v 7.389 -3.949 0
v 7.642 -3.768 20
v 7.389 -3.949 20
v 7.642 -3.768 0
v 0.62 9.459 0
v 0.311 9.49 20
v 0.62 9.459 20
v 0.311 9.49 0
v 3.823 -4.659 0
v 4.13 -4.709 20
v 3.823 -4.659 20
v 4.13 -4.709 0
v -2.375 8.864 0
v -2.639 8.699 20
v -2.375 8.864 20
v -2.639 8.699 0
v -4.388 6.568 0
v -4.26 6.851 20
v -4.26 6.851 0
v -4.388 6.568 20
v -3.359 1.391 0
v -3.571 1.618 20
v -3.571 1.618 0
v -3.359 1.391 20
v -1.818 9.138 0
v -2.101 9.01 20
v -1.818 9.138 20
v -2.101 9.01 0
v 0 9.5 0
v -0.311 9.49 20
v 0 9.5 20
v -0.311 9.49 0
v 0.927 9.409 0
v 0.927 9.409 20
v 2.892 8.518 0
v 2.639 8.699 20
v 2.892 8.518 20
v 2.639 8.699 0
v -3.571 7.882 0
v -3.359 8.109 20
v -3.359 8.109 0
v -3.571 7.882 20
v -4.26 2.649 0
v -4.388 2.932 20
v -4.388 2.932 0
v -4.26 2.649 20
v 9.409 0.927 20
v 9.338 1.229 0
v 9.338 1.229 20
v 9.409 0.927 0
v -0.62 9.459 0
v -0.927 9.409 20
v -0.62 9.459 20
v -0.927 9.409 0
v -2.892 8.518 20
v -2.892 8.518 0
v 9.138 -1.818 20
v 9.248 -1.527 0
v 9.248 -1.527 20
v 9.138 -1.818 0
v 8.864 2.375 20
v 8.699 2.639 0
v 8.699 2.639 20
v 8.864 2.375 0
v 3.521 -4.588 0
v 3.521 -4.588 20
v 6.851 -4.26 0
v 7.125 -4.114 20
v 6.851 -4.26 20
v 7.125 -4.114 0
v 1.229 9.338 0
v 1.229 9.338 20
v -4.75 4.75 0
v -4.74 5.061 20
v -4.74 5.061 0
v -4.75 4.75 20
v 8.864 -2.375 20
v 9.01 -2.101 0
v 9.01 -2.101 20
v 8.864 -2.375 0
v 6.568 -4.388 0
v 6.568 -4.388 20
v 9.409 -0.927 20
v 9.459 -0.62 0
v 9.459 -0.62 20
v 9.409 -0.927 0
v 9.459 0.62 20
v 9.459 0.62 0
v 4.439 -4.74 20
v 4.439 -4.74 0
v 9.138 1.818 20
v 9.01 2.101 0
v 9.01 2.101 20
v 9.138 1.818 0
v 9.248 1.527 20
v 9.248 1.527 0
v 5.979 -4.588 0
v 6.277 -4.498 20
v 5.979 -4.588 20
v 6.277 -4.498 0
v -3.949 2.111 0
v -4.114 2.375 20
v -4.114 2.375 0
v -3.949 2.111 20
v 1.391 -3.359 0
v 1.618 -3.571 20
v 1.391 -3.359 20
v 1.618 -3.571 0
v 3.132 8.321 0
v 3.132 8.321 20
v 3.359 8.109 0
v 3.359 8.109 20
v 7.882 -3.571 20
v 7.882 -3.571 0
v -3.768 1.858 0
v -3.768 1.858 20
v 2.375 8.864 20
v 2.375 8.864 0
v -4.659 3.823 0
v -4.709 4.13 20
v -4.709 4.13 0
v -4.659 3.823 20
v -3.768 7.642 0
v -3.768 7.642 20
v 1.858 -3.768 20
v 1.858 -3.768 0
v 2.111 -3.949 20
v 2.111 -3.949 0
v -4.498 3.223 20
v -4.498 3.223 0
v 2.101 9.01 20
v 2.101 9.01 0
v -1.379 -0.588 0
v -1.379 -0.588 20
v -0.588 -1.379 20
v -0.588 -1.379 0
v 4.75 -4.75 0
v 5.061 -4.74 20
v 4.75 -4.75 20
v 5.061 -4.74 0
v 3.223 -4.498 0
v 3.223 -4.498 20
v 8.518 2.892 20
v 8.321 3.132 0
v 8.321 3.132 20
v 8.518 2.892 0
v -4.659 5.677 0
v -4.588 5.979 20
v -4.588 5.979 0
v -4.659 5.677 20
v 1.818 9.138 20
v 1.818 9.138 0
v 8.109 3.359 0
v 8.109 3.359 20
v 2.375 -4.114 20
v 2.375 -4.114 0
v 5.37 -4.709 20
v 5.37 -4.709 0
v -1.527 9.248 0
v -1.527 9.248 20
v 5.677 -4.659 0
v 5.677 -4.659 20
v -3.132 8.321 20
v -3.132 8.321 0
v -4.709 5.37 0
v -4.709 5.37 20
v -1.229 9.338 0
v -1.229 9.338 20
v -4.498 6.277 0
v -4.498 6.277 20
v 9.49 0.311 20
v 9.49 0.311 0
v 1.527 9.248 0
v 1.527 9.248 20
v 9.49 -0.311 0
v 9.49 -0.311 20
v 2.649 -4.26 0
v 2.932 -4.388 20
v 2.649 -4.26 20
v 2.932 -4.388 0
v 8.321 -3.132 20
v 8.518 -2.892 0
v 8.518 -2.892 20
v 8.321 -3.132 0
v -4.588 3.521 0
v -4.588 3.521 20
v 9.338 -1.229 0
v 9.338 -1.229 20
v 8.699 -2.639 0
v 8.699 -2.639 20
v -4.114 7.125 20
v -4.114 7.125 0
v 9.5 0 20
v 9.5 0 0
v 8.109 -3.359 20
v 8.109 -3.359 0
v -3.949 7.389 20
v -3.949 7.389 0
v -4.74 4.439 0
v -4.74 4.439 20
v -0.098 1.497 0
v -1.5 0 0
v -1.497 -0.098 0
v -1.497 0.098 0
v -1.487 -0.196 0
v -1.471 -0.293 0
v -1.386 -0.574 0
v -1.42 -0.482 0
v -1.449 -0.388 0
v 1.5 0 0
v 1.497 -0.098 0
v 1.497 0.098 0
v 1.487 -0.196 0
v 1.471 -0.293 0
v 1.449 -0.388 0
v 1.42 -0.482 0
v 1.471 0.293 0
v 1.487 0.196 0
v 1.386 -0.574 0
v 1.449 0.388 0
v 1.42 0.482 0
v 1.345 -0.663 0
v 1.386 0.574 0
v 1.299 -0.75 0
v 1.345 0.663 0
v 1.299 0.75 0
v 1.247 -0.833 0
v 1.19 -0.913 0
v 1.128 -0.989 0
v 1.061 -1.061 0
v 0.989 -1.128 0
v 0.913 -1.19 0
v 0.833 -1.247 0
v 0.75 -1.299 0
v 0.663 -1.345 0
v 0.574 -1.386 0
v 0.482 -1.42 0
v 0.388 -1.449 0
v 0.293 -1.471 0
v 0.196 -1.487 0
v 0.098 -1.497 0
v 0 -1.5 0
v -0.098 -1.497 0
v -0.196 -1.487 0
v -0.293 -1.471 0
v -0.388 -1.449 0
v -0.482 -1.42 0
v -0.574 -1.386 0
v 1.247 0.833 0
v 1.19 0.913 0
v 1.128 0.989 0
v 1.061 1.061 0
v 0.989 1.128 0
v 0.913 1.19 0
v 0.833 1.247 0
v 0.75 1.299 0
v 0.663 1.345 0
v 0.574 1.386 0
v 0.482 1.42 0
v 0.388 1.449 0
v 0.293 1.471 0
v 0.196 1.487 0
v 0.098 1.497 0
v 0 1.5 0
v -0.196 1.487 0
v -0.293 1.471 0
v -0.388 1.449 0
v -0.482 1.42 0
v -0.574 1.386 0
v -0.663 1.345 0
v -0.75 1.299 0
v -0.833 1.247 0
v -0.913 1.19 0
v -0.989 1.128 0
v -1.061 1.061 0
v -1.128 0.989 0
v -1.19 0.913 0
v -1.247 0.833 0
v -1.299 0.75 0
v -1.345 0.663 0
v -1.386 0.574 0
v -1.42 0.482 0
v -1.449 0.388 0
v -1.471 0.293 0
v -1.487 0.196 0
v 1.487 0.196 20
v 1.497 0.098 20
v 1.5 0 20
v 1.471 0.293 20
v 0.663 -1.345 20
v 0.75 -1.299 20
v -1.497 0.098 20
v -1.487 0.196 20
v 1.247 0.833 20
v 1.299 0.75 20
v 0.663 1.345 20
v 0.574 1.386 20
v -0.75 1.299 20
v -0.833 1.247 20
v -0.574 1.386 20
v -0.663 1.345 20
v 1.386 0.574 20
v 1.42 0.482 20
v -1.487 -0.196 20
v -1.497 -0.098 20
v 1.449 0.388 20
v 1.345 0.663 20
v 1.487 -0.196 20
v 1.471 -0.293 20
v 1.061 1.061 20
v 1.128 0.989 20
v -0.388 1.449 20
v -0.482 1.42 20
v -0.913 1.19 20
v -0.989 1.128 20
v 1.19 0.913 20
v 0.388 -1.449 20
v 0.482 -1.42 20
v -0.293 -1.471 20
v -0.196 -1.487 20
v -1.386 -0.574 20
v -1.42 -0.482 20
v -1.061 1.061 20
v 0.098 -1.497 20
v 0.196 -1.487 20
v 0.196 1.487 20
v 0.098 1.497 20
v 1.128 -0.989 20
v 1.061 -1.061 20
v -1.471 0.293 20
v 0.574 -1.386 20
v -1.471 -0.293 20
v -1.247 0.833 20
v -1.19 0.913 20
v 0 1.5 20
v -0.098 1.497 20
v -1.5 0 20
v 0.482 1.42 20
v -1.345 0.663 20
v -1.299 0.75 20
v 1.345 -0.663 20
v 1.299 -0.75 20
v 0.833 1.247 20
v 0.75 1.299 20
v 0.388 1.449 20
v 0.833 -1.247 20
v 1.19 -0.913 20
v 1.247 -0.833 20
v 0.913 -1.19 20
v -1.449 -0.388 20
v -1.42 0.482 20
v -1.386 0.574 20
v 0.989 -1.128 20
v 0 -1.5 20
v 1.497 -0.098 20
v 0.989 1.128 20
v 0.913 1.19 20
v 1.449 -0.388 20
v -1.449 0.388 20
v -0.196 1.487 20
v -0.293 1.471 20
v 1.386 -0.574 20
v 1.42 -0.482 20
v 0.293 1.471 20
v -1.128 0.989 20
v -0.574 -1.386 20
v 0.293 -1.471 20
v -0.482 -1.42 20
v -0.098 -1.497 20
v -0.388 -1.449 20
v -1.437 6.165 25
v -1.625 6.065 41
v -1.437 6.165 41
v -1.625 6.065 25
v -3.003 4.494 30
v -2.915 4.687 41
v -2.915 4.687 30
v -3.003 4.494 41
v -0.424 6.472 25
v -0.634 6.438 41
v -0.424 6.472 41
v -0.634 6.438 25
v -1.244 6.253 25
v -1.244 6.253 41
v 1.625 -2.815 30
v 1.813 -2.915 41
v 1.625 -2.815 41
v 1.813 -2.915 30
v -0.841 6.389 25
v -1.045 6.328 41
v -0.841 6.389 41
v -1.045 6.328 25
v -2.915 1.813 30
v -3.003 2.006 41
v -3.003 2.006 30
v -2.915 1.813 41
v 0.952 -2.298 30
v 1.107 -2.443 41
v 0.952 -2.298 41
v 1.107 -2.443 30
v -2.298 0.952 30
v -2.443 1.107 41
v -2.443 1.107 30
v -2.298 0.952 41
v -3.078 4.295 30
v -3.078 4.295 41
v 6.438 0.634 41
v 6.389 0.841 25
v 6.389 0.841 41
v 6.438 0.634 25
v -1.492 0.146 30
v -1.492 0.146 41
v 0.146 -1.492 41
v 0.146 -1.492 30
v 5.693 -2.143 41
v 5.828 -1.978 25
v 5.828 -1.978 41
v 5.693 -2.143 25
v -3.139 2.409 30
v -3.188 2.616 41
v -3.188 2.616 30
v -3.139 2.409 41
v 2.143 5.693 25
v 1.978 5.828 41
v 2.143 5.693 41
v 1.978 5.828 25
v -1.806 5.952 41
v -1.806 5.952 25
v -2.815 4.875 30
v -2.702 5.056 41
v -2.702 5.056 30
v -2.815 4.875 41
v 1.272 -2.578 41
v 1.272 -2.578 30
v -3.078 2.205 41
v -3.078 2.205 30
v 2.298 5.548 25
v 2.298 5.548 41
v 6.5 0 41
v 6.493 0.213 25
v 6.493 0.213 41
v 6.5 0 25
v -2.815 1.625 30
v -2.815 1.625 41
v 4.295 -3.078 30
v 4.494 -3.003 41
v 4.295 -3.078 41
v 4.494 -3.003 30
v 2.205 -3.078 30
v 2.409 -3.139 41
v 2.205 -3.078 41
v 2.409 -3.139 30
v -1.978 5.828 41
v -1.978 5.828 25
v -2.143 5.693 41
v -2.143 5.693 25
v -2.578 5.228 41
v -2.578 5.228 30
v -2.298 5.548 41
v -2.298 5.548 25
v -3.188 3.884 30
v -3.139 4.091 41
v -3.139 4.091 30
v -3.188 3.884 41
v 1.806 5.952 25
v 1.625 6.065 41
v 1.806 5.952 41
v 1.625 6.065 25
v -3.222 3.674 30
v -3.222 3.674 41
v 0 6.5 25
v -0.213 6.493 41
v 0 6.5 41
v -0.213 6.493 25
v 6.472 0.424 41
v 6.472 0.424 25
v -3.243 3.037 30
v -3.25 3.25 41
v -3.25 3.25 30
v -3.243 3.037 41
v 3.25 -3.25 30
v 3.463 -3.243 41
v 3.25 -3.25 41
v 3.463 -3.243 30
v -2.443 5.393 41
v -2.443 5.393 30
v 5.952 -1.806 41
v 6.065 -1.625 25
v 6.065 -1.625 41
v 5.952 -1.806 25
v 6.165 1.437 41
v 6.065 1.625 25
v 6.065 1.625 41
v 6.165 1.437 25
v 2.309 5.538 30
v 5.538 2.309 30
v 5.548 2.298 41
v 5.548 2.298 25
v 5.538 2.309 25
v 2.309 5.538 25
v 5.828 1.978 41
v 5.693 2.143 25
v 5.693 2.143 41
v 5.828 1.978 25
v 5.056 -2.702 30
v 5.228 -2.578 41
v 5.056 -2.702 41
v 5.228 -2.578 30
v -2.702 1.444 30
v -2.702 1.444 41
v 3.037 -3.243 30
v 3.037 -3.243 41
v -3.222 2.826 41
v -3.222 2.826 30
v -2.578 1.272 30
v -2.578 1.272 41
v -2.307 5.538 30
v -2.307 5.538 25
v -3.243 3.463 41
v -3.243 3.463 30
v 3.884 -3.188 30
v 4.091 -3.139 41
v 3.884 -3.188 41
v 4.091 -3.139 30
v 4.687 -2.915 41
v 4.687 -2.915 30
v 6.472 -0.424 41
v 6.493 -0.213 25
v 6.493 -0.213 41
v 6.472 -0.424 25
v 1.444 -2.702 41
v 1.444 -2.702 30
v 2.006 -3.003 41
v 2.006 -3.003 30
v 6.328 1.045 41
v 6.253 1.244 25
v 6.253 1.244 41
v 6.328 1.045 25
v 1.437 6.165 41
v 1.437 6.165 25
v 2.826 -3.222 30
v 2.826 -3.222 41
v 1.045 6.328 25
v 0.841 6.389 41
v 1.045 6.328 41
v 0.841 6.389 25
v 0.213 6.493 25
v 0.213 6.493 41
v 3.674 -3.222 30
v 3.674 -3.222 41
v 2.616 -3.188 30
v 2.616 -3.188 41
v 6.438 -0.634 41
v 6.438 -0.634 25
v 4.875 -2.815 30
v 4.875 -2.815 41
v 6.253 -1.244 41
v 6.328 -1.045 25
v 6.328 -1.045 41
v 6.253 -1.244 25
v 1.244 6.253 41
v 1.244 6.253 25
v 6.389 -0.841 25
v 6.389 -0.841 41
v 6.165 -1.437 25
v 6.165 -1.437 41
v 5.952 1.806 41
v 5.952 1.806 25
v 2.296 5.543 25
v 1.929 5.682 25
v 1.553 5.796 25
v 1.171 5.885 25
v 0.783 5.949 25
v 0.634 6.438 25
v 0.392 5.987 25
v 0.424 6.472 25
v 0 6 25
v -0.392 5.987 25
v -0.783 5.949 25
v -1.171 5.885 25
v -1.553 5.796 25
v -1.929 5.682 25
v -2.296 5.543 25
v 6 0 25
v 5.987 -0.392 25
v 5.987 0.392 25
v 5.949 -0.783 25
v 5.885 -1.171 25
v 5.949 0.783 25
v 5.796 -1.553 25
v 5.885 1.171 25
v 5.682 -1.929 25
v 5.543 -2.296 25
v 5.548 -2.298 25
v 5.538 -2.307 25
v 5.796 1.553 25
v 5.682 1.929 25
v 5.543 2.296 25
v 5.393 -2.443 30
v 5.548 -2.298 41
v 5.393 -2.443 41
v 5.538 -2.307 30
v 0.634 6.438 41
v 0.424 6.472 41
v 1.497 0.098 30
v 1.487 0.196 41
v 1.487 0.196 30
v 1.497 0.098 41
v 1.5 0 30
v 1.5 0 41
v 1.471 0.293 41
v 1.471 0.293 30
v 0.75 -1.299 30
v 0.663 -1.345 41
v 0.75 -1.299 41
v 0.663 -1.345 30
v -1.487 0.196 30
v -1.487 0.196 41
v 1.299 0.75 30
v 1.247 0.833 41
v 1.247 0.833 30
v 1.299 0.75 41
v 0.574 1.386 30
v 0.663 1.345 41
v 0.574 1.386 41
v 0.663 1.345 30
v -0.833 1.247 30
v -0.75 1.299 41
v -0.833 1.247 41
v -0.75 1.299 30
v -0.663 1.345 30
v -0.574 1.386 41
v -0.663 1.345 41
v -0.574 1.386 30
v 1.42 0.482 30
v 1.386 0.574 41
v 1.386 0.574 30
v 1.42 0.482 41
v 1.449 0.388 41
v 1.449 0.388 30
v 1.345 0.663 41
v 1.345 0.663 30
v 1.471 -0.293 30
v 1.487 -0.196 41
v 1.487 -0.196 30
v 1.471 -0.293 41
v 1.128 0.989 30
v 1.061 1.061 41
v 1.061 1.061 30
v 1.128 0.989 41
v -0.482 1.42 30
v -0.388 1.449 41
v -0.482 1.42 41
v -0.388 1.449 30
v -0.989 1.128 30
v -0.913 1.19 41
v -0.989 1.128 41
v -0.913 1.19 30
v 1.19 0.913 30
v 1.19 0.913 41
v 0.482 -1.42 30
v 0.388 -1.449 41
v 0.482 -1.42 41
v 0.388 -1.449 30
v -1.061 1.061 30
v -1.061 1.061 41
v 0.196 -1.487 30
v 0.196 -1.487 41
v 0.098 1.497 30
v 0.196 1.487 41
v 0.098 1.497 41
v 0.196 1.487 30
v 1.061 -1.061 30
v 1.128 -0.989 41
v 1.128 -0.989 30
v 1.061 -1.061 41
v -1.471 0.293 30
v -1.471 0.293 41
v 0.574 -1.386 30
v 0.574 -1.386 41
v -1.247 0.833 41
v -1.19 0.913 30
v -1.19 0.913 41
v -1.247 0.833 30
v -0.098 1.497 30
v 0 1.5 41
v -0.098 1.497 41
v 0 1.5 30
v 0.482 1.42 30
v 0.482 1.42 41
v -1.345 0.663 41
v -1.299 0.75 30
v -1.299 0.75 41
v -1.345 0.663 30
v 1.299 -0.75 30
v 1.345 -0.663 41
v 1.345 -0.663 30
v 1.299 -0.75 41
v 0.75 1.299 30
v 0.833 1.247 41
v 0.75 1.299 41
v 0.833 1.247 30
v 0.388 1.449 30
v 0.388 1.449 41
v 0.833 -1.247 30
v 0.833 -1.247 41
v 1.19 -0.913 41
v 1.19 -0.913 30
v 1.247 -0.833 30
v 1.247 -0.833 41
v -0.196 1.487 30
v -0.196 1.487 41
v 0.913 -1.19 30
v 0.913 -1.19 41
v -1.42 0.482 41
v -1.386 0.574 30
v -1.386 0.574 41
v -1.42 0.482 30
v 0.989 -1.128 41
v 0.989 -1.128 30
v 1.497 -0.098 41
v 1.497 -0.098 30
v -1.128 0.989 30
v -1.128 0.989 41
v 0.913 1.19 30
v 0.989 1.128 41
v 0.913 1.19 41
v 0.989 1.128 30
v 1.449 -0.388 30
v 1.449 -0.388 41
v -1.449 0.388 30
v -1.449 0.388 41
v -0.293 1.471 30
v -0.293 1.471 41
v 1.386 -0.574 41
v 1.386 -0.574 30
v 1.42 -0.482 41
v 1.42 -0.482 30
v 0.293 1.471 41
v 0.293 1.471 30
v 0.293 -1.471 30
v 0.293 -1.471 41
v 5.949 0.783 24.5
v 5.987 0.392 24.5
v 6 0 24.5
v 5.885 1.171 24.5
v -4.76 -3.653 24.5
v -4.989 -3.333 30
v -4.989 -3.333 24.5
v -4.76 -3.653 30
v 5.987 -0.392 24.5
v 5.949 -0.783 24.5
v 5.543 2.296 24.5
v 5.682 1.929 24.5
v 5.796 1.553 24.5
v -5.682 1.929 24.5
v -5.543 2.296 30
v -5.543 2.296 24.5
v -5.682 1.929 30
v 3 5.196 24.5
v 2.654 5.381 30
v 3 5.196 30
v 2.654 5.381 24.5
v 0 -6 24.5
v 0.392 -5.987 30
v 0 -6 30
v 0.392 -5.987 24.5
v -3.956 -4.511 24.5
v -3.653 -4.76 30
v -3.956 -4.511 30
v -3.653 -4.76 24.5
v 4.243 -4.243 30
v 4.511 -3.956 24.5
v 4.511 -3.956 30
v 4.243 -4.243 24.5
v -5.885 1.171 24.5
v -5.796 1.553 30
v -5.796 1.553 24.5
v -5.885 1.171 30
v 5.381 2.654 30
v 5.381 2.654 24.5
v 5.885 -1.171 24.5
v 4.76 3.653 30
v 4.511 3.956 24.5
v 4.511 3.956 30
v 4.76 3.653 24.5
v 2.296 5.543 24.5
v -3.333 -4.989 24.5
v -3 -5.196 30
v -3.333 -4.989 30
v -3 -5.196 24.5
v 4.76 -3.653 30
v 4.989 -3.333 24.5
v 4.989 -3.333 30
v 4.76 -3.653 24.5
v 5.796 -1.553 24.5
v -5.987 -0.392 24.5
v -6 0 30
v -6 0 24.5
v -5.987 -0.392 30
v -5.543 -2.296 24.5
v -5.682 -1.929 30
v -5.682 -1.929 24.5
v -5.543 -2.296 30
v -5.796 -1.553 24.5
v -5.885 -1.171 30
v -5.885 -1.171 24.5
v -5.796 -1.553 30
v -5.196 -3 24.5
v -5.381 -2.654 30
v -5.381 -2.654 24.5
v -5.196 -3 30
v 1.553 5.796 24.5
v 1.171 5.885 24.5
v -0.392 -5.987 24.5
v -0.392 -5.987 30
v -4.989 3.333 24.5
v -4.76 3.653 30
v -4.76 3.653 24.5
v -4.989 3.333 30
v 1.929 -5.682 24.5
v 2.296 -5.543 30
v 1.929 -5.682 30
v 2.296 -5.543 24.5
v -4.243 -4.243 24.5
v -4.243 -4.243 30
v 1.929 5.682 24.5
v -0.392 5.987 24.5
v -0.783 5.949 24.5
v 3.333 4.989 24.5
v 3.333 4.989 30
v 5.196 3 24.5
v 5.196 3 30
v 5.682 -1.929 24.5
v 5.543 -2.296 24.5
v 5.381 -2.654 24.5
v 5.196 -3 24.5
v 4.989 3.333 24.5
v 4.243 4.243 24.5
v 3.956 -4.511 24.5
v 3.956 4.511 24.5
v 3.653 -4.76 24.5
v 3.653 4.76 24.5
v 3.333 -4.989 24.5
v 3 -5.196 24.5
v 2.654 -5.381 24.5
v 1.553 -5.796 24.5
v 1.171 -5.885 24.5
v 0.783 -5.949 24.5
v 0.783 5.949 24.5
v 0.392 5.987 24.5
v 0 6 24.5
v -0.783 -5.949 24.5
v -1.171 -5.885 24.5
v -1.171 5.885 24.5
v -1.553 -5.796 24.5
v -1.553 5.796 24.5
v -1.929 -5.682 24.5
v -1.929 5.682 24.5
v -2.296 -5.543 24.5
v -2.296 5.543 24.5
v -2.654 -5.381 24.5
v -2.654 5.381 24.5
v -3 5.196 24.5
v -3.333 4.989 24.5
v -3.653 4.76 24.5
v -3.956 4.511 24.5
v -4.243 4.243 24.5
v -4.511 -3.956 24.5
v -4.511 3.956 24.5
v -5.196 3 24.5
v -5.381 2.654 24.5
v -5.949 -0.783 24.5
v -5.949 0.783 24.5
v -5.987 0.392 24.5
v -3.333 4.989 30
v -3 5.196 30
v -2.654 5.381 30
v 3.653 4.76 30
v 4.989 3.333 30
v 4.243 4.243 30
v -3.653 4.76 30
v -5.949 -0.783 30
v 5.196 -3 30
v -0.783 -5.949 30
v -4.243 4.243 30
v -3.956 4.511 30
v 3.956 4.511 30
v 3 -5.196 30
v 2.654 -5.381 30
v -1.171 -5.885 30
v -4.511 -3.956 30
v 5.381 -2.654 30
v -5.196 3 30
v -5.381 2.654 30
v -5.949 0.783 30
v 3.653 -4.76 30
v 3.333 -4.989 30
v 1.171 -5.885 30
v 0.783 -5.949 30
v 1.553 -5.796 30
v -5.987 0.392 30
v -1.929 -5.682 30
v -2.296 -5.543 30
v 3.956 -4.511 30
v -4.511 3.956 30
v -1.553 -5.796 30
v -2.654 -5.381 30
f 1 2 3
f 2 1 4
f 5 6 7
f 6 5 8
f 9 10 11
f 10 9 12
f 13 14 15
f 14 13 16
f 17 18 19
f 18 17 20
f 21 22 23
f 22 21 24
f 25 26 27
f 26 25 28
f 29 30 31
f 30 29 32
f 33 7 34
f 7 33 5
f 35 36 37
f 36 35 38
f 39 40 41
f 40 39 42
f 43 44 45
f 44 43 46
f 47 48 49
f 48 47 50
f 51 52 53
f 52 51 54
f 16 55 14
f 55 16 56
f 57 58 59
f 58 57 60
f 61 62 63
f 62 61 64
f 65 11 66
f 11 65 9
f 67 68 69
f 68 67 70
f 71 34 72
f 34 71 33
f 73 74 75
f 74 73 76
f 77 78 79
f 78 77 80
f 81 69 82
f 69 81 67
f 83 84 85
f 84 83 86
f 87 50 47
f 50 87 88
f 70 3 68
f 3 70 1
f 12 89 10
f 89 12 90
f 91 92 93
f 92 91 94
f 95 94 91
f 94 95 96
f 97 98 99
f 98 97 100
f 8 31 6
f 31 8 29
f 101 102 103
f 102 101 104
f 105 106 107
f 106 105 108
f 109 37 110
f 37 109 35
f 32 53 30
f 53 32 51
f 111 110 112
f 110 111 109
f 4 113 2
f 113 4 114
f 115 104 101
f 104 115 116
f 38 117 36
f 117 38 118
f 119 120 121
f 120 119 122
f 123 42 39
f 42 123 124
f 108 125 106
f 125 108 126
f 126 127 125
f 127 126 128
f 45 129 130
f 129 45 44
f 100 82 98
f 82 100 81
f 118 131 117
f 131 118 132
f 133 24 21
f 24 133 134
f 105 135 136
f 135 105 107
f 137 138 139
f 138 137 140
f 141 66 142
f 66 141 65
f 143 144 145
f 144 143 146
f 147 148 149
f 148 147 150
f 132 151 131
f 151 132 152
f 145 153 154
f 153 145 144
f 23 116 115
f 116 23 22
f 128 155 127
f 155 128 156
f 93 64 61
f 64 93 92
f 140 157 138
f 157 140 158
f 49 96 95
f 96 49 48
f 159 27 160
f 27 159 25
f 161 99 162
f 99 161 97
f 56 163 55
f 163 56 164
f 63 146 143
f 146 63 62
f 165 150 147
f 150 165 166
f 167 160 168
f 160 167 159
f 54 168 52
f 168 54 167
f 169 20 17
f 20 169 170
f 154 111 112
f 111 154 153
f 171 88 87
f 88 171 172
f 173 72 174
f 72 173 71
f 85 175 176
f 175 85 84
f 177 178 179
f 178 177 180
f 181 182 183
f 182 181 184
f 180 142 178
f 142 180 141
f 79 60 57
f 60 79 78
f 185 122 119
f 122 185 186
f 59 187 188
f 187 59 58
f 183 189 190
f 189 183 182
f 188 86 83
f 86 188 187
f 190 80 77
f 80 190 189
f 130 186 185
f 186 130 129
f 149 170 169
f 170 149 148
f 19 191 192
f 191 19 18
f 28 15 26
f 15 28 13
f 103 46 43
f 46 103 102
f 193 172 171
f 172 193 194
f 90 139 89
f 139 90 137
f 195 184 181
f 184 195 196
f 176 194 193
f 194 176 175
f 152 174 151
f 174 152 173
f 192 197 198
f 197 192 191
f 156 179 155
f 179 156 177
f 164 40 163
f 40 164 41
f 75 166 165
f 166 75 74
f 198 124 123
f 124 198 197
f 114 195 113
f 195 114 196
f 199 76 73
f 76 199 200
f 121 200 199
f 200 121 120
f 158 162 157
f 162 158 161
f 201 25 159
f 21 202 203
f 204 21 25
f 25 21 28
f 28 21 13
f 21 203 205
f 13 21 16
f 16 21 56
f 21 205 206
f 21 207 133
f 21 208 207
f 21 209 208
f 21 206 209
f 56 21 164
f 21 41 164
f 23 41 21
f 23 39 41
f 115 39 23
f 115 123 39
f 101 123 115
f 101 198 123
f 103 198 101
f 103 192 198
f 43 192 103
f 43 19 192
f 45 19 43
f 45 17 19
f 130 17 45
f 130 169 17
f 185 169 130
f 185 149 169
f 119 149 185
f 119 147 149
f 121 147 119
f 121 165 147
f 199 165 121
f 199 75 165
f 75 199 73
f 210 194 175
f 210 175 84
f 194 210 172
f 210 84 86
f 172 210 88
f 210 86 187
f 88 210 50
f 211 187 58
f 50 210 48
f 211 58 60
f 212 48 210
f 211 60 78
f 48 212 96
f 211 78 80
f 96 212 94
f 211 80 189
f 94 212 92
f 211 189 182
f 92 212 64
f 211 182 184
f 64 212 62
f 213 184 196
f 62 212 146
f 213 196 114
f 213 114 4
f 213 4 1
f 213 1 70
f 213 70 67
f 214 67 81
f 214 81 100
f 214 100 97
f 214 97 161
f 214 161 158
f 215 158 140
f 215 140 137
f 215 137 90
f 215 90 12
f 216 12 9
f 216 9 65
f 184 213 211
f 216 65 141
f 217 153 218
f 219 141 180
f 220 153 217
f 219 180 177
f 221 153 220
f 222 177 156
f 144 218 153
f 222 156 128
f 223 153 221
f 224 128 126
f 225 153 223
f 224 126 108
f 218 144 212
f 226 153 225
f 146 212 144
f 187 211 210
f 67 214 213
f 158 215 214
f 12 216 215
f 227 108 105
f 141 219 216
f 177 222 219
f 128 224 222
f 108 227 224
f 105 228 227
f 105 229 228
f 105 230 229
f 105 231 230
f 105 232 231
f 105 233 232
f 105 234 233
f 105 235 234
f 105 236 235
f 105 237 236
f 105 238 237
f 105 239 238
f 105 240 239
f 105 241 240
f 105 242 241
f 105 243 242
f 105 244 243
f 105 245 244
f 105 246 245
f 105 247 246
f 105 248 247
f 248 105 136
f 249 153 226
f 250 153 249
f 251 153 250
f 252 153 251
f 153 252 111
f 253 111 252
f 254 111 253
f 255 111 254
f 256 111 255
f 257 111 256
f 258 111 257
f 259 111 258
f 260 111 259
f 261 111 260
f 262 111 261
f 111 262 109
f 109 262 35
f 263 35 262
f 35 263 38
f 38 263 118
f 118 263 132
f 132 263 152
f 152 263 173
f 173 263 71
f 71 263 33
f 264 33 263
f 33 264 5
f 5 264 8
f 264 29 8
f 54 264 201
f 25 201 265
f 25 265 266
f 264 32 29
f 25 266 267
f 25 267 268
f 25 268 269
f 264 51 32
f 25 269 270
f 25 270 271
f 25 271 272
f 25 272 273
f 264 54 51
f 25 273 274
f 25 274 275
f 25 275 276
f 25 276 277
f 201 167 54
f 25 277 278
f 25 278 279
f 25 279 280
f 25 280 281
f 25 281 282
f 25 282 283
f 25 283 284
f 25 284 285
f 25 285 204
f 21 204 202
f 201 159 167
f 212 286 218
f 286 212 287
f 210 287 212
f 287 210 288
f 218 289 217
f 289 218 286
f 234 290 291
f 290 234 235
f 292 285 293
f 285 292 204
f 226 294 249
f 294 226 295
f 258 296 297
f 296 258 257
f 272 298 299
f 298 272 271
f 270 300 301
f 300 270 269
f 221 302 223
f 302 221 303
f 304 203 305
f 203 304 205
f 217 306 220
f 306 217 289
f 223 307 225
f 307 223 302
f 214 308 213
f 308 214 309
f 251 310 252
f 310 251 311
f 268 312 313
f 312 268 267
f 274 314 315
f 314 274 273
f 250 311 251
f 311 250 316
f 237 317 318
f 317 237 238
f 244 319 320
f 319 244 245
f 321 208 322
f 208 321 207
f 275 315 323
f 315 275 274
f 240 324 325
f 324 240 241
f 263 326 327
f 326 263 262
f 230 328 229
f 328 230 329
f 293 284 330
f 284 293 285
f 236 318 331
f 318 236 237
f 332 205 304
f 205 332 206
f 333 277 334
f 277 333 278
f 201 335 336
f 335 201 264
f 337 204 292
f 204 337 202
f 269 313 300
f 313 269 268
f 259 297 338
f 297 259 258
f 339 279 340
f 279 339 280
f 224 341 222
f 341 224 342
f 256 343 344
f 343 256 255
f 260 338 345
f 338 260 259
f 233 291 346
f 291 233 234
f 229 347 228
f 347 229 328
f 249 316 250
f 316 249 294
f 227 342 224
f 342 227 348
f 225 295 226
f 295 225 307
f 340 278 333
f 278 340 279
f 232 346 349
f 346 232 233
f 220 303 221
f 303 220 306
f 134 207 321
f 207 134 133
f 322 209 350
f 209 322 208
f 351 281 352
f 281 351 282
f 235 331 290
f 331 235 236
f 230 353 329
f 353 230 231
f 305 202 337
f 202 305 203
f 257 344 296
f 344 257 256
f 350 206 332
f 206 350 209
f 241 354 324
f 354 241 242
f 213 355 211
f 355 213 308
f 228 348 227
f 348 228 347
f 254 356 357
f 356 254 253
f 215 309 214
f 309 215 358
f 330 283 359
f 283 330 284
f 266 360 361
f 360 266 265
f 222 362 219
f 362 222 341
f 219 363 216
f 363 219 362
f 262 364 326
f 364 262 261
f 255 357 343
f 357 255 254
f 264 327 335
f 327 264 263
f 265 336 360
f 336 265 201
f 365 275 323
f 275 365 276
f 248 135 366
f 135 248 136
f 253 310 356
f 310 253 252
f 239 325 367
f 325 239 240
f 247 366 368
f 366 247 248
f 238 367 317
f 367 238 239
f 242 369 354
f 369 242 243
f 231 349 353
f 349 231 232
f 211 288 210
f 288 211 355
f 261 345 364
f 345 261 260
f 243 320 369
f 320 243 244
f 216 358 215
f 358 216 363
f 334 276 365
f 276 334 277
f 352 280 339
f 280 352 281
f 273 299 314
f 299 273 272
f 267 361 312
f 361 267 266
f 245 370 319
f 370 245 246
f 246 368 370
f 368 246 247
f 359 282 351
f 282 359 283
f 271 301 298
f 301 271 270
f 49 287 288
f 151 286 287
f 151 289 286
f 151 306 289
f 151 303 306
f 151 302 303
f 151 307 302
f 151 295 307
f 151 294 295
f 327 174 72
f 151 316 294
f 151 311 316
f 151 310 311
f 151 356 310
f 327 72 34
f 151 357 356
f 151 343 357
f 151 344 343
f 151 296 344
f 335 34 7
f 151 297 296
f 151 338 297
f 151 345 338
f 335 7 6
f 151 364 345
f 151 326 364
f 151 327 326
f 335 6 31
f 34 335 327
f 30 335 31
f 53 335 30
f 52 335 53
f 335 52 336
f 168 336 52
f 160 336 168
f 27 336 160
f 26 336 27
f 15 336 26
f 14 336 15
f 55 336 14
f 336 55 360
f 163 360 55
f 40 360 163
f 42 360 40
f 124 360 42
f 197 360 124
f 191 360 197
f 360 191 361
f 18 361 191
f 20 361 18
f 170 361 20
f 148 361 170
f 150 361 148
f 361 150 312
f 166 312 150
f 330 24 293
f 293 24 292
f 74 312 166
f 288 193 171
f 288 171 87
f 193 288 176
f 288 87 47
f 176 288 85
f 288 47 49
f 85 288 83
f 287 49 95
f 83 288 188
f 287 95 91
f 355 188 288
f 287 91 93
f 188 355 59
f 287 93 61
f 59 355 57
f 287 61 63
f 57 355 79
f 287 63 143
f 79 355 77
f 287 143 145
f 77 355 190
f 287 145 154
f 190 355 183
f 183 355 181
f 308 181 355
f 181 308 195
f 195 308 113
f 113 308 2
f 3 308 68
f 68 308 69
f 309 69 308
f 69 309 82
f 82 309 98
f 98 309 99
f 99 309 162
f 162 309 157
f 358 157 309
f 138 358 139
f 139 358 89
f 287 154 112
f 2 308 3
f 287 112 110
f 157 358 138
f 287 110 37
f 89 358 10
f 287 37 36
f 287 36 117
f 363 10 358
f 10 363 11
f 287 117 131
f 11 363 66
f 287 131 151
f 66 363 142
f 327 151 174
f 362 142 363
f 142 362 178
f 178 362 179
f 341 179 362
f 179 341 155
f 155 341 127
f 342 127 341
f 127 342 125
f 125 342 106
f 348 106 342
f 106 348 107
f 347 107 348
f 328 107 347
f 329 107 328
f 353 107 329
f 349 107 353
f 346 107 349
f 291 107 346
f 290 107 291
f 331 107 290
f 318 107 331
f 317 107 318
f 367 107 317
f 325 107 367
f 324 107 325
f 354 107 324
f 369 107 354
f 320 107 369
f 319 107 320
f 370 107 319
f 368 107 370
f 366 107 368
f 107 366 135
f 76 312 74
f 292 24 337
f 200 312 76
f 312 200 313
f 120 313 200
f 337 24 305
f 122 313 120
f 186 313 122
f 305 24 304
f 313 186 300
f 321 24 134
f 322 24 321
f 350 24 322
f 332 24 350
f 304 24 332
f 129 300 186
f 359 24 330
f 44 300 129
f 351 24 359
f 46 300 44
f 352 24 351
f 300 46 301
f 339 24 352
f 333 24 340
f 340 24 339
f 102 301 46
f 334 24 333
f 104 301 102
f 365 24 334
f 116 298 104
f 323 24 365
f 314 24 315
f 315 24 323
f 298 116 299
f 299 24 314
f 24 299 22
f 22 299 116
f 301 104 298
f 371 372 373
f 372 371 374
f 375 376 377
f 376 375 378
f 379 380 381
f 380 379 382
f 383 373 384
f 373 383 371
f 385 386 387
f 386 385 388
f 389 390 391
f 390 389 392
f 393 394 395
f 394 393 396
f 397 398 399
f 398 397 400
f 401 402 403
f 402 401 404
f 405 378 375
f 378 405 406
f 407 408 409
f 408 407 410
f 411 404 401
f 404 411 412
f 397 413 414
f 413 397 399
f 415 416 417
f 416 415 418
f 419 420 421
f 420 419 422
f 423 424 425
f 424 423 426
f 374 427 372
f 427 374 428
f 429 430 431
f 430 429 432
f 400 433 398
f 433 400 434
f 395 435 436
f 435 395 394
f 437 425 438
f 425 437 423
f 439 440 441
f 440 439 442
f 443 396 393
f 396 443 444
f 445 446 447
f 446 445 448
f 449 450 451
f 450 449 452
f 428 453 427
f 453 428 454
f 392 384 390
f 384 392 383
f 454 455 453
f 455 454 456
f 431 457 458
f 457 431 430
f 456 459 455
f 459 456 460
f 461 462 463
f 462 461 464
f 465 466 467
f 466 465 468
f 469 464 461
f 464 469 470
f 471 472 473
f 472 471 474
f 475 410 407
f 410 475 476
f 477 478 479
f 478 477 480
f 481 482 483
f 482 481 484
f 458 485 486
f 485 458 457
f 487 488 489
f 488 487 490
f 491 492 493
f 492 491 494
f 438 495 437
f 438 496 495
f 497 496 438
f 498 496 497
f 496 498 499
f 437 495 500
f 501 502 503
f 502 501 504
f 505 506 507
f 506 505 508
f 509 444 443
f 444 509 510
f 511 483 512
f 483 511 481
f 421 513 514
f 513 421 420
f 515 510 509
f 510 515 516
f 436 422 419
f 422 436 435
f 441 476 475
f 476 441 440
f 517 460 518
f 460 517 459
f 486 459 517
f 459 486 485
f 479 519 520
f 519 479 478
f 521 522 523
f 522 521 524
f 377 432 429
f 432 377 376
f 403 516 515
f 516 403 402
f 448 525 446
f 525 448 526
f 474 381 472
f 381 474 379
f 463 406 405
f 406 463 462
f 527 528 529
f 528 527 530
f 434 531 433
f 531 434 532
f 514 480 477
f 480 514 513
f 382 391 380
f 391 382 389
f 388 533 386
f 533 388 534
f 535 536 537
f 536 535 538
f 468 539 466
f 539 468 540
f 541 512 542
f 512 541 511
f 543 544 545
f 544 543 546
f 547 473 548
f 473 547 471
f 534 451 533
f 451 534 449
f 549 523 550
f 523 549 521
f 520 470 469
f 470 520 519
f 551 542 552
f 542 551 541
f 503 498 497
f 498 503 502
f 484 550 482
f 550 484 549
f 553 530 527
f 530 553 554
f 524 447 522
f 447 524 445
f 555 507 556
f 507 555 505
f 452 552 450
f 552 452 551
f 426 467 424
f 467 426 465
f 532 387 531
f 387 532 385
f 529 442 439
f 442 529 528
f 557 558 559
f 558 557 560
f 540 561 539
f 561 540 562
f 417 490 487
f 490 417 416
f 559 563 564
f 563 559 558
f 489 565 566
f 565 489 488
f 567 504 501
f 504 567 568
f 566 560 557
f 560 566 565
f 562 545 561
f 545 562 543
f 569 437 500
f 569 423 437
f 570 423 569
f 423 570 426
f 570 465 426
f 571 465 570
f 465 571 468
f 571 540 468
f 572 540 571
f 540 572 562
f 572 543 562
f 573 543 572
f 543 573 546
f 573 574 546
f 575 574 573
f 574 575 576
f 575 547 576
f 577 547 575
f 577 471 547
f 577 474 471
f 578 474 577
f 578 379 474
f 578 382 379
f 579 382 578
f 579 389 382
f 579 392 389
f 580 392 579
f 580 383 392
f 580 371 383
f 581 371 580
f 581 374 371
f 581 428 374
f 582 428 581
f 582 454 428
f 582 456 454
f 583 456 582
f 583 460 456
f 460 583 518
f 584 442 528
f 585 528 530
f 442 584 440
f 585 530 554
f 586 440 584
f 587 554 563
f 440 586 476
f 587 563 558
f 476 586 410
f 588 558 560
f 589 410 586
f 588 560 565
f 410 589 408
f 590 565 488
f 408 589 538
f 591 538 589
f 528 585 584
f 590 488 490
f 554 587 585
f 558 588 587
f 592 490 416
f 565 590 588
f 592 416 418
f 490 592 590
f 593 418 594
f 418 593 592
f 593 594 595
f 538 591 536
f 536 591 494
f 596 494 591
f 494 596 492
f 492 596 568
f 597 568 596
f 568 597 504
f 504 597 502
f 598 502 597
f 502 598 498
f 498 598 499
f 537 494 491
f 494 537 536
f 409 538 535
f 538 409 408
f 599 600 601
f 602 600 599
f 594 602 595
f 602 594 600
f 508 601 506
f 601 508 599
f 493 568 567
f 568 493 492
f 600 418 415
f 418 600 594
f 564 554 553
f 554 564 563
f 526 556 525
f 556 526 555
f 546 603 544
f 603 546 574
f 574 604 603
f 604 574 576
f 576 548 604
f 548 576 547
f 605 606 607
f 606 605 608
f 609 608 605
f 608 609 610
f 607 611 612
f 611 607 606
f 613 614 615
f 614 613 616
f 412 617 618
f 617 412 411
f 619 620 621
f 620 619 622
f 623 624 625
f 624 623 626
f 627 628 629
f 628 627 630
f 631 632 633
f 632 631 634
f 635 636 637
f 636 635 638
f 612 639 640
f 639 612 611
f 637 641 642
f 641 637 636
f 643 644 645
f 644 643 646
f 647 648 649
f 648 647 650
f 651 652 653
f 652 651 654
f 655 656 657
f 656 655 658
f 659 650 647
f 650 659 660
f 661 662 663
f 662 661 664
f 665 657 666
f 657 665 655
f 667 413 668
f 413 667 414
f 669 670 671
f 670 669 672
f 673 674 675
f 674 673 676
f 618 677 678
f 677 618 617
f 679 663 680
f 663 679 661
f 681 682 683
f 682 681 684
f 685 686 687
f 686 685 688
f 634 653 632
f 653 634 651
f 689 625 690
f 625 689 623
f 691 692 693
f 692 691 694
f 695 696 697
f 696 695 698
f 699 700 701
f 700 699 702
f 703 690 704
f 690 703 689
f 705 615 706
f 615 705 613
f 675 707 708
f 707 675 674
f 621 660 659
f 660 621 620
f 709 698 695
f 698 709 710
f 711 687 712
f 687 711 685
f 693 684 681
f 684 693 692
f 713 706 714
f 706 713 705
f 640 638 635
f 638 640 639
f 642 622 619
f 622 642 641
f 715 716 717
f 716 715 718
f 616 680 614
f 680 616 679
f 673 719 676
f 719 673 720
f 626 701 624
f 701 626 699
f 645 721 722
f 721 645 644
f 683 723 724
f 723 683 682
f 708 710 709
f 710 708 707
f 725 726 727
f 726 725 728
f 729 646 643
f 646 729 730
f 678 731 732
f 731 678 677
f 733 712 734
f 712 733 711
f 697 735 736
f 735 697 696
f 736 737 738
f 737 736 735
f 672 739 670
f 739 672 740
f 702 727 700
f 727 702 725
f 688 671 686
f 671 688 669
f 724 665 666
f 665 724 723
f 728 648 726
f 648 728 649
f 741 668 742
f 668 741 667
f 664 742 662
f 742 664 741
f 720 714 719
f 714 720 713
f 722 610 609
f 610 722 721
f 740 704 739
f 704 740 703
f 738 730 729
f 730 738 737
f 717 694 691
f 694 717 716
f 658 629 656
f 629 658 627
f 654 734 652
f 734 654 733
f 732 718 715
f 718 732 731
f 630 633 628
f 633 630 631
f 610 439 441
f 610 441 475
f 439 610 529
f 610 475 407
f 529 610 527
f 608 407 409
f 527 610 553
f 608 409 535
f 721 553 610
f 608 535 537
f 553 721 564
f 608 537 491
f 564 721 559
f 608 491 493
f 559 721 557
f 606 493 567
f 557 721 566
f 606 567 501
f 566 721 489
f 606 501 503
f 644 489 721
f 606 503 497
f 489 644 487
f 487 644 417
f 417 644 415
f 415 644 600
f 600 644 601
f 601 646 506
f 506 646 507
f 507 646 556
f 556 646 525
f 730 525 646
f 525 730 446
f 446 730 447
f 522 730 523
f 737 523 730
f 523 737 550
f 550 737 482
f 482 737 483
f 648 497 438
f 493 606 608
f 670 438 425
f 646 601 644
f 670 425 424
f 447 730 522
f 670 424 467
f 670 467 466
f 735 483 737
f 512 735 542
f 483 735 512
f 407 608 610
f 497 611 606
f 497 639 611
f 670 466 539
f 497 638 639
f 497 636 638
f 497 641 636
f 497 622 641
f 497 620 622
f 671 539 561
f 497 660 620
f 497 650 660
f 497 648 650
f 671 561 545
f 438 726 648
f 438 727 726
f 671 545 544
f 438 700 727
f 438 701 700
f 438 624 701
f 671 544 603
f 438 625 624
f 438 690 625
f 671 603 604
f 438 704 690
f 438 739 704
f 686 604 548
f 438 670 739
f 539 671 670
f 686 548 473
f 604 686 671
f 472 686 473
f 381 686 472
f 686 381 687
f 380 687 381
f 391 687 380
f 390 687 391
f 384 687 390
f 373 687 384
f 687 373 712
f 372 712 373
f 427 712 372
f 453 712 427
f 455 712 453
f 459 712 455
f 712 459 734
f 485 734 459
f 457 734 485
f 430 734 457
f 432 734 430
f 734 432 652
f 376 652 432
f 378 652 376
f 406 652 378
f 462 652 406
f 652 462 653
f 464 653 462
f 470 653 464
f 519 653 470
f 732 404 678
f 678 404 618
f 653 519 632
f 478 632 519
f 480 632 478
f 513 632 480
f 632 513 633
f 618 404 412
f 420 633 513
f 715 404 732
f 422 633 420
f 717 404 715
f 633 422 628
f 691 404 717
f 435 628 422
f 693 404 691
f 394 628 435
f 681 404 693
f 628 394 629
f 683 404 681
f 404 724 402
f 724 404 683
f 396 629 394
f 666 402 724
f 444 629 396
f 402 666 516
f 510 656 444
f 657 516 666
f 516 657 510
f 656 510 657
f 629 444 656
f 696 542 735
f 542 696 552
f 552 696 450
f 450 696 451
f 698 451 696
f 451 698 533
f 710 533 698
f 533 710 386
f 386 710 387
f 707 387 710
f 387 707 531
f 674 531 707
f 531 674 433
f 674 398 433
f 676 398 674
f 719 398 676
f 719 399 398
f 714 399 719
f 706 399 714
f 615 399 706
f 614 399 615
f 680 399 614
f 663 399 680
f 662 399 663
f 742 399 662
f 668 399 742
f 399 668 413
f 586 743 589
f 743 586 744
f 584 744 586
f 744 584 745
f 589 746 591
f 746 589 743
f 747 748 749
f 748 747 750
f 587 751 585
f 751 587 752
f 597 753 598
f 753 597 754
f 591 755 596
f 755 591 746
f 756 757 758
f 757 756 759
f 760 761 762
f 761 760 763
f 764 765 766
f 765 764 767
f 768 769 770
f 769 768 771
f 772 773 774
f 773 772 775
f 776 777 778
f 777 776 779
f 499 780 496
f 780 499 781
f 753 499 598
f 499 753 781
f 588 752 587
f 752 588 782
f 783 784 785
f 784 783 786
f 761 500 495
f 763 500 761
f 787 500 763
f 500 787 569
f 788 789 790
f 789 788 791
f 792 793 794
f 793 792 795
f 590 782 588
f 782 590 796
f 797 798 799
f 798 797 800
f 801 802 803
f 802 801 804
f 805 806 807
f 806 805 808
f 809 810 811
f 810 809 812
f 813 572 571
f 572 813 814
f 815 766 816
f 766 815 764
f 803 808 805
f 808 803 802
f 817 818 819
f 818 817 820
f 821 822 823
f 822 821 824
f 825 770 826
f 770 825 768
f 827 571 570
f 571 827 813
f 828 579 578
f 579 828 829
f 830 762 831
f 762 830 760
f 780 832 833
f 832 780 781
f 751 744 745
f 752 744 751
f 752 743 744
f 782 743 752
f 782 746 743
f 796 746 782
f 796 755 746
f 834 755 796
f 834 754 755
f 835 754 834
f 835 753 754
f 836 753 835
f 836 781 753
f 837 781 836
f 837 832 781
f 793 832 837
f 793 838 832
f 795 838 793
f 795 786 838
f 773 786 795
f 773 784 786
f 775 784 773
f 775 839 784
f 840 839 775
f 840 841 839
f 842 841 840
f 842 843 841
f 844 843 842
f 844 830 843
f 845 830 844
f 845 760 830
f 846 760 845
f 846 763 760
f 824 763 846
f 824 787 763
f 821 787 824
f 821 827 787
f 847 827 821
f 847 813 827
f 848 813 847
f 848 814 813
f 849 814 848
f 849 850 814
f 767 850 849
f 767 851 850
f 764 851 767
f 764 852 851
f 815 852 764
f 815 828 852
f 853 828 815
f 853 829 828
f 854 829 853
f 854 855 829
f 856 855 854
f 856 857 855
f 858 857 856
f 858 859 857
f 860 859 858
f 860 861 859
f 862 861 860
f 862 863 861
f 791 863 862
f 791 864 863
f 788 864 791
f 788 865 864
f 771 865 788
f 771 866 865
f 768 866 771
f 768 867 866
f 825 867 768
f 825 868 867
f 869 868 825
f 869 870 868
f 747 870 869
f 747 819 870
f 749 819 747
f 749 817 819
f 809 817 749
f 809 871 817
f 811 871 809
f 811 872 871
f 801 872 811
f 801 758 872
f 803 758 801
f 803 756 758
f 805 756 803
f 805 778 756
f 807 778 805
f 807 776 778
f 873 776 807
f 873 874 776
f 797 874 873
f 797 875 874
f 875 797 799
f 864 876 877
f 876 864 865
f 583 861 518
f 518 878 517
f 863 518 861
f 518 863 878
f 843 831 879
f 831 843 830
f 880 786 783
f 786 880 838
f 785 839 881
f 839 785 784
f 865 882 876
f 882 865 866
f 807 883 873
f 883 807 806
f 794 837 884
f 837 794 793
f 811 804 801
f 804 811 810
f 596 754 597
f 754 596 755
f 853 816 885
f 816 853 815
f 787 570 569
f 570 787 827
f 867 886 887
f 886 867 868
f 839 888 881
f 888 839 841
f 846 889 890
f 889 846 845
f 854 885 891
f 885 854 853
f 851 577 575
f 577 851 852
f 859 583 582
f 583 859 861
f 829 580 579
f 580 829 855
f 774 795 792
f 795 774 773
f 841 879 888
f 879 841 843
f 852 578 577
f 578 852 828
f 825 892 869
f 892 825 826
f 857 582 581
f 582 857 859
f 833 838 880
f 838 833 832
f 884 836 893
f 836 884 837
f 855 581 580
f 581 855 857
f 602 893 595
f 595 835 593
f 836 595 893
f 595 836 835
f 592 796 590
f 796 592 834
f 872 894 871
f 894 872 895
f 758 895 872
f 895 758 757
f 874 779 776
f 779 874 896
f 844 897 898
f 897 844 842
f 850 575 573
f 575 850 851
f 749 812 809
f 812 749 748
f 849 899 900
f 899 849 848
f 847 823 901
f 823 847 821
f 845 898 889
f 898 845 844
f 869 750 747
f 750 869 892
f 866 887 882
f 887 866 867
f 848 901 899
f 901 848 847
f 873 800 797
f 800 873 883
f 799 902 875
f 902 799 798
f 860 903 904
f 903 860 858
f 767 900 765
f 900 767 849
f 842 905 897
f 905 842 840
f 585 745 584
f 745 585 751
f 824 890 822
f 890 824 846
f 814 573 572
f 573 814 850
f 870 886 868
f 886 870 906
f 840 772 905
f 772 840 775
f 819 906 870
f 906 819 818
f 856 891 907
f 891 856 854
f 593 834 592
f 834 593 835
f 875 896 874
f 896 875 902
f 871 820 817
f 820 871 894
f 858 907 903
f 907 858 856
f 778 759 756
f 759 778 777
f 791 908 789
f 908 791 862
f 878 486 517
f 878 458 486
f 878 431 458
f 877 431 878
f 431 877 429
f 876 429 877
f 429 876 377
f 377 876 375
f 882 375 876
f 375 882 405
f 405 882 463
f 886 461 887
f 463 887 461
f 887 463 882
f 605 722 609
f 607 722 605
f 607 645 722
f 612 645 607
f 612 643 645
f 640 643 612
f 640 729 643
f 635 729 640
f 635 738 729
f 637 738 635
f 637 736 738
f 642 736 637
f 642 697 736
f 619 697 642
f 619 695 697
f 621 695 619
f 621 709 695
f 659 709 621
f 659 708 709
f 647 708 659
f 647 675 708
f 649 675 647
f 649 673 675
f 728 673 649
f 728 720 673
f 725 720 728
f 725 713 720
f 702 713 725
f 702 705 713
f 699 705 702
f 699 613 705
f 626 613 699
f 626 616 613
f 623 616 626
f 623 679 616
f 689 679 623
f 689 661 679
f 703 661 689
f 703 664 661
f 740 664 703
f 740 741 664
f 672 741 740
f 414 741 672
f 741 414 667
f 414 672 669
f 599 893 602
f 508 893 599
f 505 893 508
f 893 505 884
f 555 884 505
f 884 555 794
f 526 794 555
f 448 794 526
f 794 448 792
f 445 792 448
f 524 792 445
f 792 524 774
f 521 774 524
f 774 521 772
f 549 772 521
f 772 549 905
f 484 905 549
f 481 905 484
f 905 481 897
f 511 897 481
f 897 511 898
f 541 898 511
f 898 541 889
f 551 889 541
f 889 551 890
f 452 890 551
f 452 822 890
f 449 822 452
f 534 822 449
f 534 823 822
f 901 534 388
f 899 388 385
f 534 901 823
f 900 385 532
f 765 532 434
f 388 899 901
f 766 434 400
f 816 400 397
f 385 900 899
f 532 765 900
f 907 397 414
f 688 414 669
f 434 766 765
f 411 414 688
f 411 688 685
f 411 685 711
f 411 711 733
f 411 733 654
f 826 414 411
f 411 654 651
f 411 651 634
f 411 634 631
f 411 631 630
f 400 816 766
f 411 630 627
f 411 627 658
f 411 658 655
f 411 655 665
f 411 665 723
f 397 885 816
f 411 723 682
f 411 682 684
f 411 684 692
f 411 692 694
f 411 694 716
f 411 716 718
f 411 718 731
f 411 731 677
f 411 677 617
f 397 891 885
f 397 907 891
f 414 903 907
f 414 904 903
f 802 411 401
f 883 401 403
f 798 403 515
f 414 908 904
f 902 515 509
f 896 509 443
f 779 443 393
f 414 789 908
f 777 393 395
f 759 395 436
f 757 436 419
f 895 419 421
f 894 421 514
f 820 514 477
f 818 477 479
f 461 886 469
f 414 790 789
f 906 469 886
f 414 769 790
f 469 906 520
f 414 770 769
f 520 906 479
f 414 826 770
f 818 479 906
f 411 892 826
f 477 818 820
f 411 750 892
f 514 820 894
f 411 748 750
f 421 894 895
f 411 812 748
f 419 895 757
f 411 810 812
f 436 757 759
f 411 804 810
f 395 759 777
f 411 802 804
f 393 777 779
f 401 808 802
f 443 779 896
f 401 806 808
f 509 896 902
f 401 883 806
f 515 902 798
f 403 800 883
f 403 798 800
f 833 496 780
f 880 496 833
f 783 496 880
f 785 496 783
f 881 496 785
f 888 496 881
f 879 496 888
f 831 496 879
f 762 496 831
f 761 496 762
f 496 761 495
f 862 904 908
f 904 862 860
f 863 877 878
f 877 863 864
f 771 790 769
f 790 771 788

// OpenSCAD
// Straight hose-barb reducer: 8 mm tubing (z = 0..20) -> 5 mm tubing (z = 25..41)
// Print orientation: standing upright along +Z, centred on origin in X/Y

$fn = 96;

// ---- 8 mm tubing section ----
barb_h_8      = 10;   // barb height
od_8_bottom   = 7.5;  // outer diameter at bottom of 8 mm barbs
od_8_top      = 9.5;  // outer diameter at top of 8 mm barbs
bore          = 3;    // through-bore diameter

// ---- 5 mm tubing section ----
barb_h_5      = 8;    // barb height
od_5_bottom   = 6.5;  // outer diameter at bottom of 5 mm barbs
od_5_top      = 5.0;  // outer diameter at top of 5 mm barbs

// ---- Collar ----
collar_d      = 12;   // collar diameter
collar_top_z  = 25;   // collar top height (also start of 5 mm barbs)

// ---- Misc ----
eps           = 0.5;  // overlap for clean booleans / steps
n_barbs       = 2;    // stacked barbs per section

// Barb profile (sawtooth): grow from bottom OD to top OD, then step back to bottom OD
module barb_profile(h, d_bottom, d_top) {
    r_bottom = d_bottom / 2;
    r_top    = d_top / 2;
    // 1.5 rad (~86 deg) of growth, then a straight drop back to r_bottom
    hull() {
        for (a = [0, 90])
            rotate([0, 0, a])
                translate([r_bottom, 0, 0])
                    cylinder(h = h, r = r_bottom);
        for (a = [0, 90])
            rotate([0, 0, a])
                translate([r_top, 0, 0])
                    cylinder(h = h, r = r_top);
    }
}

union() {
    // 8 mm tubing section (z = 0..20)
    for (i = [0 : n_barbs - 1])
        translate([0, 0, i * barb_h_8])
            difference() {
                barb_profile(barb_h_8, od_8_bottom, od_8_top);
                translate([0, 0, -eps])
                    cylinder(h = barb_h_8 + 2 * eps, d = bore);
            }

    // Collar (z = 20..25)
    translate([0, 0, collar_top_z - eps])
        cylinder(h = eps + 5, d = collar_d);

    // 5 mm tubing section (z = 25..41)
    for (i = [0 : n_barbs - 1])
        translate([0, 0, collar_top_z + i * barb_h_5])
            difference() {
                barb_profile(barb_h_5, od_5_bottom, od_5_top);
                translate([0, 0, -eps])
                    cylinder(h = barb_h_5 + 2 * eps, d = bore);
            }
}
